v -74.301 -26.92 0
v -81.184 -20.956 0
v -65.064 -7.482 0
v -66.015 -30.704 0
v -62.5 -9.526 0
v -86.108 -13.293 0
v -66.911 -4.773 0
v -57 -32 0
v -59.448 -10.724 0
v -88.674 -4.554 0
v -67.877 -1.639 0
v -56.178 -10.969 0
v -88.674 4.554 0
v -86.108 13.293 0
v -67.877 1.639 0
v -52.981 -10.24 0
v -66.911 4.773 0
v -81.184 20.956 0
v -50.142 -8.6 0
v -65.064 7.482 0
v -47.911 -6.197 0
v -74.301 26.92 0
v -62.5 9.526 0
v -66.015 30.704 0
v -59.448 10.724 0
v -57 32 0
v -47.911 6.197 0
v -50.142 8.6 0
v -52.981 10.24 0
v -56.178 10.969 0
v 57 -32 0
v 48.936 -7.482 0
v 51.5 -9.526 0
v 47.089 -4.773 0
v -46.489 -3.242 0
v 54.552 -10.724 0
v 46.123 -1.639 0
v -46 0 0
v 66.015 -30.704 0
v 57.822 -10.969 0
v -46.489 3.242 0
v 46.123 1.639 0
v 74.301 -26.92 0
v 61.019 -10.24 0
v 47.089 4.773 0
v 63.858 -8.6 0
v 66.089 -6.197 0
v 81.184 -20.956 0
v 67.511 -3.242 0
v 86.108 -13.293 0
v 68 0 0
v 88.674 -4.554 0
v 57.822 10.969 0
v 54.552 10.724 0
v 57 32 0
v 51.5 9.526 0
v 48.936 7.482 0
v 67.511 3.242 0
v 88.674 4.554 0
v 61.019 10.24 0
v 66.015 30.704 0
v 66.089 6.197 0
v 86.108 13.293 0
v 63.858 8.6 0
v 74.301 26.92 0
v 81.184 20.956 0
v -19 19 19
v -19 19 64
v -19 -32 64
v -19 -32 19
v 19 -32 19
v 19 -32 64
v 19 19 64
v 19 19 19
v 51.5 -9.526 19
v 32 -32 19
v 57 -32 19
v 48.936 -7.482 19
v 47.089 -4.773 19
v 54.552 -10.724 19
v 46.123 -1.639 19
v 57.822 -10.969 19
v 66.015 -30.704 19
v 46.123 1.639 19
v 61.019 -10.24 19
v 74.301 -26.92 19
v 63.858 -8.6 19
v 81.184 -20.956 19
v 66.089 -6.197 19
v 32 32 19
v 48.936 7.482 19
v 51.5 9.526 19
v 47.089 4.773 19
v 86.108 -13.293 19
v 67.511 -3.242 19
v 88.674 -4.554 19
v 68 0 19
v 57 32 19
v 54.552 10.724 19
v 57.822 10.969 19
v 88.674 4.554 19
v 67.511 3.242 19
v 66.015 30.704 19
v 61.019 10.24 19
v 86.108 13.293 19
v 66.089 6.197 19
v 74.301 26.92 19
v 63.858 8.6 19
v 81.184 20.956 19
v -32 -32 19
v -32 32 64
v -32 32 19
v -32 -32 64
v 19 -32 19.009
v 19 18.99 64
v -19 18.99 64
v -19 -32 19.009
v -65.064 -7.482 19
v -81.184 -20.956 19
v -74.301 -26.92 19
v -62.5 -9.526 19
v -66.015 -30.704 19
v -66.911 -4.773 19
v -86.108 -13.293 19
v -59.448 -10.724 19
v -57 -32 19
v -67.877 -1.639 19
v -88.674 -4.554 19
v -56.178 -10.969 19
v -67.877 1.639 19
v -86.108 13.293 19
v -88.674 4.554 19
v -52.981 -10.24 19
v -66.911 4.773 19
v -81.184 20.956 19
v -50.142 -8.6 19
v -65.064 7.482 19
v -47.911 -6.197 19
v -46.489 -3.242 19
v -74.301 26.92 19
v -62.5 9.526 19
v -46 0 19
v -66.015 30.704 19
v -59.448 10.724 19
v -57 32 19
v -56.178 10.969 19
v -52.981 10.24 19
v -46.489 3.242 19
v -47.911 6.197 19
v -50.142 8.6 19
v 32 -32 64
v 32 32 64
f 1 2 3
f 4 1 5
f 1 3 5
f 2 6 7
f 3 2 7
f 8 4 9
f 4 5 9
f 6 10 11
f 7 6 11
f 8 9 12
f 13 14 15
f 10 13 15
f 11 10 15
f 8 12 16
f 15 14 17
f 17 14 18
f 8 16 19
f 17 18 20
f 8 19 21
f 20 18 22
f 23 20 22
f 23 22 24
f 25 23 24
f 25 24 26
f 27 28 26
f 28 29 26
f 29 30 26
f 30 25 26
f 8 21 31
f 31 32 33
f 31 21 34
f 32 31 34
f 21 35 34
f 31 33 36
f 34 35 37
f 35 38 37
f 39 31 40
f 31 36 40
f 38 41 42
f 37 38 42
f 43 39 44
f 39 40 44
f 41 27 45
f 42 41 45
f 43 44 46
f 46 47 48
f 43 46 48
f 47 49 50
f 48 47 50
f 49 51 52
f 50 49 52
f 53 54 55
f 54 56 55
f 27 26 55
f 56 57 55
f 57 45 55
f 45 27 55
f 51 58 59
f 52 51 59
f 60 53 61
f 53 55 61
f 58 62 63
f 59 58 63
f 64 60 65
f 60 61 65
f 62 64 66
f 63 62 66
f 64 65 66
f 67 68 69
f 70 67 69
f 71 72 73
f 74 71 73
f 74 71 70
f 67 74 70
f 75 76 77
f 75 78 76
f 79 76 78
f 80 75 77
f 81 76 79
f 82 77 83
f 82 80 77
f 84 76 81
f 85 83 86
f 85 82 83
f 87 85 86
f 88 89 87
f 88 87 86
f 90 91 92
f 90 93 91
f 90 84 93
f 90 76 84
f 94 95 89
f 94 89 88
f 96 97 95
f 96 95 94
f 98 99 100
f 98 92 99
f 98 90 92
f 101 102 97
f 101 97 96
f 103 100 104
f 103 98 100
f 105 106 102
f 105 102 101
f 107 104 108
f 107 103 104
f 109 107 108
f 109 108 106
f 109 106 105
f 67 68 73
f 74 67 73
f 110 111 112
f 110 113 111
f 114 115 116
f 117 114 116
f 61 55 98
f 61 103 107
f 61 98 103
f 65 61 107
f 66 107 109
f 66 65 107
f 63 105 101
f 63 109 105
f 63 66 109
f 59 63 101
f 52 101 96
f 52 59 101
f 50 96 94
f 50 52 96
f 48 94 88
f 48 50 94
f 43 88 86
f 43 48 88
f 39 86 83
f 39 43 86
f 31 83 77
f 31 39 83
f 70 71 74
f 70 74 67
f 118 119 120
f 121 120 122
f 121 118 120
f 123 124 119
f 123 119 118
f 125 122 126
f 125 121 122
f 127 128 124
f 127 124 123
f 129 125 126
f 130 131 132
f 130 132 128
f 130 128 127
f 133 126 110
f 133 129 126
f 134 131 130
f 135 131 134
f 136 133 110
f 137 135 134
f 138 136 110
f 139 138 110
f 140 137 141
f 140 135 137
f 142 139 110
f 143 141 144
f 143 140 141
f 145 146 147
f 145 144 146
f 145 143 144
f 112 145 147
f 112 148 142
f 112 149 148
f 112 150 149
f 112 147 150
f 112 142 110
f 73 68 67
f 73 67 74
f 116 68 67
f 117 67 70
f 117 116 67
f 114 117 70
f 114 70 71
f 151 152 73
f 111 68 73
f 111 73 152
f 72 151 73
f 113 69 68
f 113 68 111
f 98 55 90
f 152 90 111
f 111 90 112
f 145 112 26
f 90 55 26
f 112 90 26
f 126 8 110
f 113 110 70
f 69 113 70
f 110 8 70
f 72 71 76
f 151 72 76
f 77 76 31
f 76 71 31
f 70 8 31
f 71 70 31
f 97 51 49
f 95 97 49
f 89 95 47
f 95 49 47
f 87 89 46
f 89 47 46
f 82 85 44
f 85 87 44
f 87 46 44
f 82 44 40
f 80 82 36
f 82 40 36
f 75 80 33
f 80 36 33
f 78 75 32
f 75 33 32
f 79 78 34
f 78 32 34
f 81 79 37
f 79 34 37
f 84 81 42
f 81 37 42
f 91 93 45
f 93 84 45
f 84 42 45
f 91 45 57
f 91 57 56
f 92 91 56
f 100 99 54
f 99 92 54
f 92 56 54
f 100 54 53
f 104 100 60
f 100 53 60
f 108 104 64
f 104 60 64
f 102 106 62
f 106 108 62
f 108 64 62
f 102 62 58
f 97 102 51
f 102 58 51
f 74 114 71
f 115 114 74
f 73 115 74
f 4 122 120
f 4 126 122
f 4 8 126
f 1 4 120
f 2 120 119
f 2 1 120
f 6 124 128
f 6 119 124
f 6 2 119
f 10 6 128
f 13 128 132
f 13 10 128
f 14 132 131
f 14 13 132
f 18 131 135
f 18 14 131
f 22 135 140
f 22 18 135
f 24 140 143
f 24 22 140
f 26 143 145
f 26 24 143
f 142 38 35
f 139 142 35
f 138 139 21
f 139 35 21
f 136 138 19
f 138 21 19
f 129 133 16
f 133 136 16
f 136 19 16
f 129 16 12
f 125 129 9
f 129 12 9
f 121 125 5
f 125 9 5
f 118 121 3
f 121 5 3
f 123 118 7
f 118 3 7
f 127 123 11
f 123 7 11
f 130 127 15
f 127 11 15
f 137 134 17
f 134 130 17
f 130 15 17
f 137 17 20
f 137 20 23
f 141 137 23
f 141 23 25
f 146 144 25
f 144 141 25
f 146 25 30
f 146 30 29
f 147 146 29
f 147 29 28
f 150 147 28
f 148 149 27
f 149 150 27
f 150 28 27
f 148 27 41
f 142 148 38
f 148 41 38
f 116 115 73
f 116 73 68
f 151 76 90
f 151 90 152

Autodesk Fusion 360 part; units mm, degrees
sketch "Bottom Sketch" plane through (0, 0, 0) normal (0, 0, 1) x (1, 0, 0)
  line L0 (-57, -32) -> (57, -32)
  line L1 (57, 32) -> (-57, 32)
  circle A0 centre (-57, 0) radius 11
  circle A1 centre (57, 0) radius 11
  arc A2 (-57, 32) -> (-57, -32) centre (-57, 0) ccw
  arc A3 (57, -32) -> (57, 32) centre (57, 0) ccw
  dimension "d1" = 114
  dimension "d2" = 64
  dimension "d7" = 64
  dimension "d8" = 64
  dimension "d9" = 22
  dimension "d10" = 22
extrude "Extrude1" add sketch "Bottom Sketch" along normal blind 19 makes body 1
sketch "Main Construction" plane through (0, -32, 0) normal (0, -1, 0) x (1, 0, 0)
  line L0 (-57, 0) -> (57, 0)
  line L1 (57, 0) -> (57, 19)
  line L2 (57, 19) -> (-57, 19)
  line L3 (-57, 19) -> (-57, 0)
  line L4 (-32, 0) -> (32, 0)
  line L5 (32, 0) -> (32, 64)
  line L6 (32, 64) -> (-32, 64)
  line L7 (-32, 64) -> (-32, 0)
  dimension "d13" = 64
  dimension "d14" = 64
  dimension "d15" = 25
extrude "Extrude2" add sketch "Main Construction" against normal blind 64 contours L2 L5 L6 L7 bodies 1
sketch "Top" plane through (0, 0, 64) normal (0, 0, 1) x (-1, 0, 0)
  line L0 (32, 32) -> (-32, 32)
  line L1 (-32, 32) -> (-32, -32)
  line L2 (-32, -32) -> (32, -32)
  line L3 (32, -32) -> (32, 32)
  line L4 (19, -19) -> (19, 32) construction
  line L5 (-19, -19) -> (-19, 32) construction
  line L6 (19, -19) -> (-19, -19) construction
  line L7 (19, -19) -> (19, 32)
  line L8 (19, -19) -> (-19, -19)
  line L9 (-19, 32) -> (-19, -19)
  dimension "d18" = 38
  dimension "d19" = 13
  dimension "d20" = 13
extrude "Extrude3" cut sketch "Top" against normal blind 45 contours L0 L7 L8 L9 bodies 1
extrude "Extrude4" add sketch "Top" against normal blind 45 separate body contours L0 L7 L8 L9 makes body 2
chamfer "Chamfer1" distance 51 distance2 45 1 edges at (0, -32, 64) measured on face at (-6.3333, 2, 64) on bodies 2
sketch "Sketch5" plane through (32, 0, 0) normal (1, 0, 0) x (0, 1, 0)
  line L0 (-32, 64) -> (-32, 19)
  line L1 (-32, 19) -> (32, 19)
  line L2 (32, 19) -> (32, 64)
  line L3 (32, 64) -> (-32, 64)
  line L4 (-32, 64) -> (19, 64)
  line L5 (19, 64) -> (19, 19)
  dimension "d25" = 51
  dimension "d26" = 45
sketch "Sketch6" plane through (0, 0, 0) normal (1, 0, 0) x (0, 1, 0)
  line L0 (-32, 64) -> (-32, 19)
  line L1 (-32, 19) -> (19, 19)
sketch "Sketch4" plane through (32, 0, 0) normal (1, 0, 0) x (0, 1, 0)
  line L0 (-32, 64) -> (-32, 19)
  line L1 (-32, 19) -> (32, 19)
  line L2 (32, 19) -> (32, 64)
  line L3 (32, 64) -> (-32, 64)
  line L4 (19.1401, 64) -> (19.1401, 19)
  line L5 (-32, 19) -> (-32, 64)
  line L6 (-32, 64) -> (19.1401, 64)
equation "d20 = ( ( 64 - 38 ) / 2 ) * 1 mm"
equation "d21 = -( 64 mm - 19 mm )"
equation "d23 = -( 64 mm - 19 mm )"
equation "d26 = 64 mm - 19 mm"
equation "d28 = 64 mm - 19 mm"
